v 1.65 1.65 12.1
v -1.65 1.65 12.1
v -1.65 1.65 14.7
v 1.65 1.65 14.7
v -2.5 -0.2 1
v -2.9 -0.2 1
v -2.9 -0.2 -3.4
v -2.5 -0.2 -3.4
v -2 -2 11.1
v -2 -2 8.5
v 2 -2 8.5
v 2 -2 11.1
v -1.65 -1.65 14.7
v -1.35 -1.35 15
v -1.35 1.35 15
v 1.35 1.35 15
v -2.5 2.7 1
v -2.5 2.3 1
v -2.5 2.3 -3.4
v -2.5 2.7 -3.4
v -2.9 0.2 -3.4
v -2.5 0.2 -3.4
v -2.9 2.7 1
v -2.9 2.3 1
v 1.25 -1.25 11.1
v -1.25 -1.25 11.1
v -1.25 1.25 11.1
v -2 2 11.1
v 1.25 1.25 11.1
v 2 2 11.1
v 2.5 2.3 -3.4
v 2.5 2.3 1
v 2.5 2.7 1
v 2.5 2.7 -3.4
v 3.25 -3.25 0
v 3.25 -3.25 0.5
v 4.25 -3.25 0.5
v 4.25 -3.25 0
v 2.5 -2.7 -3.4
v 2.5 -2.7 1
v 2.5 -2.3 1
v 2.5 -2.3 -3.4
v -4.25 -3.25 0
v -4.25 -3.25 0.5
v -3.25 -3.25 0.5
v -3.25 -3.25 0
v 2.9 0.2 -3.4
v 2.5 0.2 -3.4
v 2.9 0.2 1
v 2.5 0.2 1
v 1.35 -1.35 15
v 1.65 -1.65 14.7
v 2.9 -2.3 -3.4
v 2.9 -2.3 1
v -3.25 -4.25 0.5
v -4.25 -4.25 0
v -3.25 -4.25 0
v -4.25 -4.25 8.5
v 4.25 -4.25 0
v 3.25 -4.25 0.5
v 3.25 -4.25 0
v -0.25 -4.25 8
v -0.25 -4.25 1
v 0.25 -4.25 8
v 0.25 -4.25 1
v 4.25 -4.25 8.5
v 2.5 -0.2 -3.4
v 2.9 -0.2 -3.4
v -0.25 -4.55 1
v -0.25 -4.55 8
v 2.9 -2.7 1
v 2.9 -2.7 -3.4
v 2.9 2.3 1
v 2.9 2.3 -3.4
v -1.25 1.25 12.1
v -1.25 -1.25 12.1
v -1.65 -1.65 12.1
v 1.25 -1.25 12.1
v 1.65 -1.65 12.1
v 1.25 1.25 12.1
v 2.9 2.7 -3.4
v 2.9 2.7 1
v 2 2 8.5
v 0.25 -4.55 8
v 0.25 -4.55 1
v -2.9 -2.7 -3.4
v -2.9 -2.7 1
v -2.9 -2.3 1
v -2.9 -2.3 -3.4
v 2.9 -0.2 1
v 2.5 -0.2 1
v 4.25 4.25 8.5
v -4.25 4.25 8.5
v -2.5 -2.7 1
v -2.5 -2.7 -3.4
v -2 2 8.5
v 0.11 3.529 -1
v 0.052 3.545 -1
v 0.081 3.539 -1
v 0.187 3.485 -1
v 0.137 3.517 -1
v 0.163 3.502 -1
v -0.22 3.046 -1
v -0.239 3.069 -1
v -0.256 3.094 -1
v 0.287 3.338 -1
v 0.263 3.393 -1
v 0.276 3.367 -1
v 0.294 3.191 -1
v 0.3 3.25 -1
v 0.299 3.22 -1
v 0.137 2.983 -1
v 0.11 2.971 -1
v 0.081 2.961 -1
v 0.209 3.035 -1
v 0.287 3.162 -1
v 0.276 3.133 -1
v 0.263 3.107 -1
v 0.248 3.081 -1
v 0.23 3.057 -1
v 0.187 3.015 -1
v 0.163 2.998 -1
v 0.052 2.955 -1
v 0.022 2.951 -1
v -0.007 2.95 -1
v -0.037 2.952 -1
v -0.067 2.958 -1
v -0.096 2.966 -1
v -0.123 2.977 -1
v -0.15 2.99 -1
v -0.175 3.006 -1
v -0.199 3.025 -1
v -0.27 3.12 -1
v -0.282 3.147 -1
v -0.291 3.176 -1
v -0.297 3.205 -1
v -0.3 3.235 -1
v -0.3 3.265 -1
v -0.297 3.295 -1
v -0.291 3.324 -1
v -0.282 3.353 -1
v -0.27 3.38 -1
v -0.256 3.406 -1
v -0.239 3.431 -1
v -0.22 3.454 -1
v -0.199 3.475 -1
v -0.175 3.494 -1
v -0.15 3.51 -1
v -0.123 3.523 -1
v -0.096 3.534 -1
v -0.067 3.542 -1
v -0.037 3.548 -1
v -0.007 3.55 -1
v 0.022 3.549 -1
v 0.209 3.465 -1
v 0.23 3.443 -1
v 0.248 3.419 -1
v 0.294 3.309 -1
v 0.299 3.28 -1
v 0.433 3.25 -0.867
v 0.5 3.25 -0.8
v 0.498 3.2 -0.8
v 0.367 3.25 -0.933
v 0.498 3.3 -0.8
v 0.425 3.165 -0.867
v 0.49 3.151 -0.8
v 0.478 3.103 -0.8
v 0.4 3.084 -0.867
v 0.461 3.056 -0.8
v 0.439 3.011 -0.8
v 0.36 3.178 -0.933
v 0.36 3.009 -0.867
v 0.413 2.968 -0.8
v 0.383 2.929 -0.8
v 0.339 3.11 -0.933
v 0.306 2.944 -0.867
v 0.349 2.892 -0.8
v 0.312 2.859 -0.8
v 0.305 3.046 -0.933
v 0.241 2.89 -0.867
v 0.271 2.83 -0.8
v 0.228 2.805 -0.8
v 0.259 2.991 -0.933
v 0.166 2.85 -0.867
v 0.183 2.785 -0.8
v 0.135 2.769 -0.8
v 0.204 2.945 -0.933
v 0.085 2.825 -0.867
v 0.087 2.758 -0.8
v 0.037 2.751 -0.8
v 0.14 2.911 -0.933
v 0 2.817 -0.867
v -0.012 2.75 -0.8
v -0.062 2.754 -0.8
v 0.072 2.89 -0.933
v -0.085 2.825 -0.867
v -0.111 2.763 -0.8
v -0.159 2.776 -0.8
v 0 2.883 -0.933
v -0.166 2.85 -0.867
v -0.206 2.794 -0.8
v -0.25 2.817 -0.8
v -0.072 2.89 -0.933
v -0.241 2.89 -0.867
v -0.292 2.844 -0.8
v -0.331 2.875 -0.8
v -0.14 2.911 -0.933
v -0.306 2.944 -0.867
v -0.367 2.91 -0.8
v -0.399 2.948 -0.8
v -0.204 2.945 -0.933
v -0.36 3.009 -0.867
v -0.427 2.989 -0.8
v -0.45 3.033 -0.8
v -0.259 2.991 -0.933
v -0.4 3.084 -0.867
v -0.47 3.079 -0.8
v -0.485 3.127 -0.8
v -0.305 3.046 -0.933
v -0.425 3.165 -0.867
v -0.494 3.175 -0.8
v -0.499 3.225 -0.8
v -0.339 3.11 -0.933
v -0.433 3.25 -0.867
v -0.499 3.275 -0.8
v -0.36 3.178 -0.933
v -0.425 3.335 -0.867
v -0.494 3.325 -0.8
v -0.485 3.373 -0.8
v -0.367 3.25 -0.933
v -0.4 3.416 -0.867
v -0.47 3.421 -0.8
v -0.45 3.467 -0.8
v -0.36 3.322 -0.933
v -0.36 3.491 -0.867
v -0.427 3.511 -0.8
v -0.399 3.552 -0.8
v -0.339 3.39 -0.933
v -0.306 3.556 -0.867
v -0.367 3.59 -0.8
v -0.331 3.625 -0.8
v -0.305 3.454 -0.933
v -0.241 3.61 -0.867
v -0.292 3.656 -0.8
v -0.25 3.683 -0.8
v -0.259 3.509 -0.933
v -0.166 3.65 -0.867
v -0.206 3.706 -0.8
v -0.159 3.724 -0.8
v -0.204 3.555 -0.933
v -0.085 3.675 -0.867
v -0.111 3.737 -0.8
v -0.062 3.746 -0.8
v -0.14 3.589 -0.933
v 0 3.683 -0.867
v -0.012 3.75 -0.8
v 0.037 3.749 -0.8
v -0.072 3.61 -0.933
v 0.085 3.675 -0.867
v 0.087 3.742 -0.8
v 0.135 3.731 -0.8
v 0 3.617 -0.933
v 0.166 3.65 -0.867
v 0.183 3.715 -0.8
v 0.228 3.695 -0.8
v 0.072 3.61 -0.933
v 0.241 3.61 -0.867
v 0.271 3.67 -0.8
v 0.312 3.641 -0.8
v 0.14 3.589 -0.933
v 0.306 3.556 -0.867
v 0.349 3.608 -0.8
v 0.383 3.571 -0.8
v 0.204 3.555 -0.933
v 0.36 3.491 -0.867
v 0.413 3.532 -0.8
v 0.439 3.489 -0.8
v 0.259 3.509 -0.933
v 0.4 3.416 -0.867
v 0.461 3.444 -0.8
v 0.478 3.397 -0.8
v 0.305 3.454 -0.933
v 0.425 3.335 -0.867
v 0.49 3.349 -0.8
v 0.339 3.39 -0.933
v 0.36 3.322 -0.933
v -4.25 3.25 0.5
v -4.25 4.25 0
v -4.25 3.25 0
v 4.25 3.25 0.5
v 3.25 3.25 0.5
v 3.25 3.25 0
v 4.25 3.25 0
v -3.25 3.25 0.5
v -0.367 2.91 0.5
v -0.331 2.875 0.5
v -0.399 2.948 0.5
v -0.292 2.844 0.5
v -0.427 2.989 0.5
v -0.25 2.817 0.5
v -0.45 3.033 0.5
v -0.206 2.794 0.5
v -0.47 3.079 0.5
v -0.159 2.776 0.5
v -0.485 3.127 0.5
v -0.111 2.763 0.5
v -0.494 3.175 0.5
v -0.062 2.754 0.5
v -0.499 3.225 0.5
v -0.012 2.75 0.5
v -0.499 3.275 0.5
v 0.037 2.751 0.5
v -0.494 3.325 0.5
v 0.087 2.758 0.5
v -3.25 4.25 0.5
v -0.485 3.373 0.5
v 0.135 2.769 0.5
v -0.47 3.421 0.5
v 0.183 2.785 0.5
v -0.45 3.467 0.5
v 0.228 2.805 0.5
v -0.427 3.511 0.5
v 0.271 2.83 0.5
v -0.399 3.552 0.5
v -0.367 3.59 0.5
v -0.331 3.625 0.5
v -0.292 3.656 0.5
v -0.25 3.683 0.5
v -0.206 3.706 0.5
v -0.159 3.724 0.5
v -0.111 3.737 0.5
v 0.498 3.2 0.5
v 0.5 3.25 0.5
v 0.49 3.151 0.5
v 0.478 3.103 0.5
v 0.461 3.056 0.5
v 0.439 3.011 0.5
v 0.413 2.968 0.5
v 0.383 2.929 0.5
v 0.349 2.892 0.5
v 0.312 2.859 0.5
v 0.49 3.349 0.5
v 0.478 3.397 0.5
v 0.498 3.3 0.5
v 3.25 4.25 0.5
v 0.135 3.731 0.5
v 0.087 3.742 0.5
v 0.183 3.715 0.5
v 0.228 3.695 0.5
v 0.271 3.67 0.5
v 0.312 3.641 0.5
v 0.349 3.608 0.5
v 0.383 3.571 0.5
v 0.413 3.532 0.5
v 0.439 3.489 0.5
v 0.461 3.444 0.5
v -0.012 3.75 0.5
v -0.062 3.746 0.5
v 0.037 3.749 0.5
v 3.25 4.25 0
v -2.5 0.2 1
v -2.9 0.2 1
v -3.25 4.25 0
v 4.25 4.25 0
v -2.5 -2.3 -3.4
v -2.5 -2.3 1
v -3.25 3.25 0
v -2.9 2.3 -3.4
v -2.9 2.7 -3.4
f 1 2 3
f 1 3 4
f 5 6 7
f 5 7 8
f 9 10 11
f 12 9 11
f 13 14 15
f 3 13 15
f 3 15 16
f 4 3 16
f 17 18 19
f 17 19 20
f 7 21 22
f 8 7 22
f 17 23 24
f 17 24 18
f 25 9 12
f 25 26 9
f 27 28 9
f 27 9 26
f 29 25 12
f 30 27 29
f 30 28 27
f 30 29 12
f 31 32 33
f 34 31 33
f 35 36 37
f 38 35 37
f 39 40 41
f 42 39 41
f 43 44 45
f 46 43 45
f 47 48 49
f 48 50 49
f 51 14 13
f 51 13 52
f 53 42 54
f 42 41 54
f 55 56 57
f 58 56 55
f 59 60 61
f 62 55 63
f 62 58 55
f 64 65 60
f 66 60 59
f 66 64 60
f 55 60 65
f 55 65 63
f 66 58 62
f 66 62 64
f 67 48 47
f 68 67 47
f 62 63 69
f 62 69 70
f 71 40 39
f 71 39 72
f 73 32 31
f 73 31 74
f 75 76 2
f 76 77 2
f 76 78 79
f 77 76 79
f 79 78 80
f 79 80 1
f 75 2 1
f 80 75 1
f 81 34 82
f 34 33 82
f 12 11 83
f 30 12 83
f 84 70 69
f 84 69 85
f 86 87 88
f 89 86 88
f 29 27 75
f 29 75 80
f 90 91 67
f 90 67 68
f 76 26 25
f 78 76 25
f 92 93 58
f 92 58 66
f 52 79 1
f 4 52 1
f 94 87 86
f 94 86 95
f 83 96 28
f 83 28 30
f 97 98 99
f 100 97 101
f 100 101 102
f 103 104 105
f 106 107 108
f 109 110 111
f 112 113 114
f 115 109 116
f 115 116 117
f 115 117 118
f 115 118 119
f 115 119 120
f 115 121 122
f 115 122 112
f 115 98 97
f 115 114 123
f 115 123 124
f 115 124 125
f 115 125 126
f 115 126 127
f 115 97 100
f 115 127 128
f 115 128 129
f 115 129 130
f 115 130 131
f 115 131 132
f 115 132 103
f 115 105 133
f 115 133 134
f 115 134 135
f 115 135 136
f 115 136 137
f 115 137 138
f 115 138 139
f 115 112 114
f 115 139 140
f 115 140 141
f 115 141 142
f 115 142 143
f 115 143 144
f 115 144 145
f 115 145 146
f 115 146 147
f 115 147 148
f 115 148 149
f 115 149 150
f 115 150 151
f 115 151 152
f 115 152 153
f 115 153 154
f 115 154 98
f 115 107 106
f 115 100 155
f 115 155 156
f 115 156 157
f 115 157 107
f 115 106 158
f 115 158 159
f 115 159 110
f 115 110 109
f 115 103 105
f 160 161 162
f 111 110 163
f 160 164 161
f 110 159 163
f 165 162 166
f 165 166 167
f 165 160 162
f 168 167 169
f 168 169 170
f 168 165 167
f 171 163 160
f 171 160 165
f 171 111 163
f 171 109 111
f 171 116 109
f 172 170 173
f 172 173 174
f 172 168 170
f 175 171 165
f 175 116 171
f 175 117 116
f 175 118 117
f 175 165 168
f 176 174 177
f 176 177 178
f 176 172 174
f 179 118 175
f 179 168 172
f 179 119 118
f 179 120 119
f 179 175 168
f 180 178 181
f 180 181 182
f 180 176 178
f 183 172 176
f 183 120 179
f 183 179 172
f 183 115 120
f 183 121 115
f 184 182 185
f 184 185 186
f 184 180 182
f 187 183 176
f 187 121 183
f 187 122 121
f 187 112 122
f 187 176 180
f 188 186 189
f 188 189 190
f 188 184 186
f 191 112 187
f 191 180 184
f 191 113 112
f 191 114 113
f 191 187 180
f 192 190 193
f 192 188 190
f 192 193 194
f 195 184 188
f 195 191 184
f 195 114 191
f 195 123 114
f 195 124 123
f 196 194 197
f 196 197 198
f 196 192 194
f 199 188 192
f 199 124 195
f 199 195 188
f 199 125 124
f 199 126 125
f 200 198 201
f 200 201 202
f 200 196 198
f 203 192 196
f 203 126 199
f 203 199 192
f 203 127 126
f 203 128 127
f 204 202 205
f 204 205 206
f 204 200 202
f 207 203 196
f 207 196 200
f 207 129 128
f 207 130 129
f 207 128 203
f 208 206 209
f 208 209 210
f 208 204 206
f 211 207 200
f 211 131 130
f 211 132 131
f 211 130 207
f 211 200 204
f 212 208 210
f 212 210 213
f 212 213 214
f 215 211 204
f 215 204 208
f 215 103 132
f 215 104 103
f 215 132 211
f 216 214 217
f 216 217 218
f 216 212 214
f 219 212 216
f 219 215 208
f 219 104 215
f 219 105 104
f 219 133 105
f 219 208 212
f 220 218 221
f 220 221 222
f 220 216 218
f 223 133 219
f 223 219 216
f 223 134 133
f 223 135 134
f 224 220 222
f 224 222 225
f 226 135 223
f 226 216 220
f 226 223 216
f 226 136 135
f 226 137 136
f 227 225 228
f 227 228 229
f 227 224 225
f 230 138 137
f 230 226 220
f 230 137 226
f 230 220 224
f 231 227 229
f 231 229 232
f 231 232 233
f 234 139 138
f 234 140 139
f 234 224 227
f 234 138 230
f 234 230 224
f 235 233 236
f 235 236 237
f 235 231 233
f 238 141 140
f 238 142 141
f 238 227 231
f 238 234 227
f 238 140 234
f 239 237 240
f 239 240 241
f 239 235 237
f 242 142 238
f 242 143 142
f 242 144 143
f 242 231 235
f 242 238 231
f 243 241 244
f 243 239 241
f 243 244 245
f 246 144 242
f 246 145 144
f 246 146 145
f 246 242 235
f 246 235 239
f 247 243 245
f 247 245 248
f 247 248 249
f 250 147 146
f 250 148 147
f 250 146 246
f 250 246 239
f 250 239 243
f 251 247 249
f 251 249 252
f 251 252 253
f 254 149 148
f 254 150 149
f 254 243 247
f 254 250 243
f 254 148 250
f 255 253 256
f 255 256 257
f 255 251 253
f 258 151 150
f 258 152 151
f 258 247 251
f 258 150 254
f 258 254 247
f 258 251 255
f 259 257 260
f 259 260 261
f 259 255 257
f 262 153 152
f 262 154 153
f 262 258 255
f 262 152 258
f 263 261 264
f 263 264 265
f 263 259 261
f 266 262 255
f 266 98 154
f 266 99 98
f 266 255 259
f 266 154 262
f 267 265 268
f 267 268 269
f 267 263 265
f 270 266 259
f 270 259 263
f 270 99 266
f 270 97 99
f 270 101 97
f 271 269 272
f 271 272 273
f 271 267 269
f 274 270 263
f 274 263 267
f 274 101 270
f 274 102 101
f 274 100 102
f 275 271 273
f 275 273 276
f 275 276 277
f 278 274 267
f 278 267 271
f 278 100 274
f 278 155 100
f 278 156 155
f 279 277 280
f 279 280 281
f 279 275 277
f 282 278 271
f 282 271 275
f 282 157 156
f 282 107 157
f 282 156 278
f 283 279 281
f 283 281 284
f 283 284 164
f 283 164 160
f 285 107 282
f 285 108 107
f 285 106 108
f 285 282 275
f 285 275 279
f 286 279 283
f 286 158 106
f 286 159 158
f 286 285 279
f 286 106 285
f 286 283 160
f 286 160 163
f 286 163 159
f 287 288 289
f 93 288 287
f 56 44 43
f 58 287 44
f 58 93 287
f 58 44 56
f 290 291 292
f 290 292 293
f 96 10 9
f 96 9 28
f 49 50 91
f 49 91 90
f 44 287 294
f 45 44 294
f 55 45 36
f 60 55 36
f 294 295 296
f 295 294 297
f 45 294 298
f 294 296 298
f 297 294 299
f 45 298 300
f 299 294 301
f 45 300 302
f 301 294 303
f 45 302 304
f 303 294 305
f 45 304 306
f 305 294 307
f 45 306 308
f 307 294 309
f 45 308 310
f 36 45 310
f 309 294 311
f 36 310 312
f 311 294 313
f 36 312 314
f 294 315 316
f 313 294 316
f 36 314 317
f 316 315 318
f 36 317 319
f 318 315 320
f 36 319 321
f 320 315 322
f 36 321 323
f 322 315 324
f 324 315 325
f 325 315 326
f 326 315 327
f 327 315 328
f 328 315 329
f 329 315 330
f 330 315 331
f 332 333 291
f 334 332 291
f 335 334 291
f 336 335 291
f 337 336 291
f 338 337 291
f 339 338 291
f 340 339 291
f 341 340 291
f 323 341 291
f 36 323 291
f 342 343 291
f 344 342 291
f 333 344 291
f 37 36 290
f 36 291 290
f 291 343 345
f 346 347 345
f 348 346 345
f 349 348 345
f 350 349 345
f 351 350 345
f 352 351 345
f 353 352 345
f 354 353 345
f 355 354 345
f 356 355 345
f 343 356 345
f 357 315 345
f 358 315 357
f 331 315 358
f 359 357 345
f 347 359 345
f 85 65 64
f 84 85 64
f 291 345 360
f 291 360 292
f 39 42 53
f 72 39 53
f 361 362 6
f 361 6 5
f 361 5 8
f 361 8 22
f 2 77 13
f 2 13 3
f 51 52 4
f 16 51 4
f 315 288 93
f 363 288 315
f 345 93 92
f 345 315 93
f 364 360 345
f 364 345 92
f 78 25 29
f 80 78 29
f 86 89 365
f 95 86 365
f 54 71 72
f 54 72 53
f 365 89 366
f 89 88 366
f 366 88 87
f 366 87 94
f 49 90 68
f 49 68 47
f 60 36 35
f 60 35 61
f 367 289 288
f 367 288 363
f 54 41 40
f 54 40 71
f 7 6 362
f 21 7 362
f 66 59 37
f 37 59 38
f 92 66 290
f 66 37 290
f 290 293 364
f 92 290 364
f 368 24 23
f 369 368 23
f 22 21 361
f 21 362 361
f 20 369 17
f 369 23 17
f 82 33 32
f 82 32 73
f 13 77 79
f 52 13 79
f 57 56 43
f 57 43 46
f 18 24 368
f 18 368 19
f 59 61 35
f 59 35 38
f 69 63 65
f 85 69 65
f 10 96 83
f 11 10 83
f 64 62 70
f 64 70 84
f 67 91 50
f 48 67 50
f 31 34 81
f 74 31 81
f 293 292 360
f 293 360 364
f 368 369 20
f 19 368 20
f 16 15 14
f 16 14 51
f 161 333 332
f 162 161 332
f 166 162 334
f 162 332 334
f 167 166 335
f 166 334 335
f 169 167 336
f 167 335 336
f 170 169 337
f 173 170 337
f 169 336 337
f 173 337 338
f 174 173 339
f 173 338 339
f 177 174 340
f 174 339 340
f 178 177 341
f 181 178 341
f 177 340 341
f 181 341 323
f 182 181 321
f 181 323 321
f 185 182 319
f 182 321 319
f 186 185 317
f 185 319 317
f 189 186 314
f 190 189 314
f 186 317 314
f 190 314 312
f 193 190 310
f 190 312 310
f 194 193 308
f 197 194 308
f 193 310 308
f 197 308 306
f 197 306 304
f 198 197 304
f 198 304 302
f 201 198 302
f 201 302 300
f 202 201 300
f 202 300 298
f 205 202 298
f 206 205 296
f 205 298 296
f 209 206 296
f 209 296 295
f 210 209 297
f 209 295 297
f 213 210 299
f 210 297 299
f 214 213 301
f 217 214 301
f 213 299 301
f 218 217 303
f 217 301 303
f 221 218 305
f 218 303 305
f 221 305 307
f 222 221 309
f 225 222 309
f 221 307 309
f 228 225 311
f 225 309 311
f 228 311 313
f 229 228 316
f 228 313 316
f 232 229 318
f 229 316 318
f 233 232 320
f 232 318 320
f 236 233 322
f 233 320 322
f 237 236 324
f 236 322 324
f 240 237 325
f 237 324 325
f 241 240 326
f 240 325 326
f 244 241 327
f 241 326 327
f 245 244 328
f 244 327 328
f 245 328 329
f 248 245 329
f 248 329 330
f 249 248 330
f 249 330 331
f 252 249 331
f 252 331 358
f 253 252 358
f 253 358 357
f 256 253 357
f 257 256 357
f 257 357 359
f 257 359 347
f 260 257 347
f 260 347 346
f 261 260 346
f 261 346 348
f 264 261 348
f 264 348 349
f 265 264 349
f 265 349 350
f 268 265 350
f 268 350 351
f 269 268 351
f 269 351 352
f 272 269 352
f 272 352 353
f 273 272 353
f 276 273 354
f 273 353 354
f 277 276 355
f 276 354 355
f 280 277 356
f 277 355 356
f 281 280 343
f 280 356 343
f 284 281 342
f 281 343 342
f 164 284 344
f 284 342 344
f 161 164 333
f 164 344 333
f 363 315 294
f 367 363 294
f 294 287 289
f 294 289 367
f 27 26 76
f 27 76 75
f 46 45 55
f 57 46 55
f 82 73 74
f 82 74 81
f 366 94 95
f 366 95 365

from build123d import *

# Parameters (mm, degrees)
F0_W          = 0.4
F0_H          = 0.4
F1_DEPTH      = 1
F1_DEPTH_BACK = 3.4
F3_START      = 0.5
F2_W          = 8.5
F2_H          = 8.5
F3_DEPTH      = 8
F4_W          = 1
F4_H          = 1
F5_DEPTH      = 0.5
F6_W          = 0.5
F6_H          = 7
F7_DEPTH      = 0.3
F8_R          = 0.5
F9_DEPTH      = 1.5
F10_SIZE      = 0.2
F11_W         = 4
F11_H         = 4
F12_DEPTH     = 2.6
F13_W         = 2.5
F13_H         = 2.5
F14_DEPTH     = 1
F15_W         = 3.3
F15_H         = 3.3
F16_DEPTH     = 2.9
F17_SIZE2     = 0.3
F17_SIZE      = 0.3


with BuildPart() as f1:
    # F0 (on Top) → F1 (new body, two sides)
    with BuildSketch(Plane.XY) as f1_sk:
        with Locations((-2.7, -2.5)):
            Rectangle(F0_W, F0_H)
    extrude(amount=F1_DEPTH)
    extrude(f1_sk.sketch, amount=-F1_DEPTH_BACK)


with BuildPart() as f1b:
    # F0 (on Top) → F1, piece 2 (new body, two sides)
    with BuildSketch(Plane.XY) as f1_2_sk:
        with Locations((-2.7, 0)):
            Rectangle(F0_W, F0_H)
    extrude(amount=F1_DEPTH)
    extrude(f1_2_sk.sketch, amount=-F1_DEPTH_BACK)


with BuildPart() as f1c:
    # F0 (on Top) → F1, piece 3 (new body, two sides)
    with BuildSketch(Plane.XY) as f1_3_sk:
        with Locations((-2.7, 2.5)):
            Rectangle(F0_W, F0_H)
    extrude(amount=F1_DEPTH)
    extrude(f1_3_sk.sketch, amount=-F1_DEPTH_BACK)


with BuildPart() as f1d:
    # F0 (on Top) → F1, piece 4 (new body, two sides)
    with BuildSketch(Plane.XY) as f1_4_sk:
        with Locations((2.7, 2.5)):
            Rectangle(F0_W, F0_H)
    extrude(amount=F1_DEPTH)
    extrude(f1_4_sk.sketch, amount=-F1_DEPTH_BACK)


with BuildPart() as f1e:
    # F0 (on Top) → F1, piece 5 (new body, two sides)
    with BuildSketch(Plane.XY) as f1_5_sk:
        with Locations((2.7, 0)):
            Rectangle(F0_W, F0_H)
    extrude(amount=F1_DEPTH)
    extrude(f1_5_sk.sketch, amount=-F1_DEPTH_BACK)


with BuildPart() as f1f:
    # F0 (on Top) → F1, piece 6 (new body, two sides)
    with BuildSketch(Plane.XY) as f1_6_sk:
        with Locations((2.7, -2.5)):
            Rectangle(F0_W, F0_H)
    extrude(amount=F1_DEPTH)
    extrude(f1_6_sk.sketch, amount=-F1_DEPTH_BACK)


with BuildPart() as f3:
    # F2 (on Top) → F3 (new body)
    with BuildSketch(Plane.XY.offset(F3_START)):
        Rectangle(F2_W, F2_H)
    extrude(amount=F3_DEPTH)

    # F4 (on face) → F5 (join)
    with BuildSketch(Plane(origin=(0, 0, 0.5), x_dir=(1, 0, 0), z_dir=(0, 0, -1))):
        with Locations((-3.75, 3.75)):
            Rectangle(F4_W, F4_H)
        with Locations((3.75, 3.75)):
            Rectangle(F4_W, F4_H)
        with Locations((3.75, -3.75)):
            Rectangle(F4_W, F4_H)
        with Locations((-3.75, -3.75)):
            Rectangle(F4_W, F4_H)
    extrude(amount=F5_DEPTH)

    # F6 (on face) → F7 (join)
    with BuildSketch(Plane.XZ.offset(4.25)):
        with Locations((0, 4.5)):
            Rectangle(F6_W, F6_H)
    extrude(amount=F7_DEPTH)

    # F8 (on face) → F9 (join)
    with BuildSketch(Plane(origin=(0, 0, 0.5), x_dir=(1, 0, 0), z_dir=(0, 0, -1))):
        with Locations((0, -3.25)):
            Circle(F8_R)
    extrude(amount=F9_DEPTH)

    # F10
    f10_edges = [f3.edges().sort_by_distance(p)[0] for p in [
        (-0.5, 3.25, -1),
    ]]
    chamfer(f10_edges, length=F10_SIZE)


with BuildPart() as f12:
    # F11 (on face) → F12 (new body)
    with BuildSketch(Plane.XY.offset(8.5)):
        Rectangle(F11_W, F11_H)
    extrude(amount=F12_DEPTH)

    # F13 (on face) → F14 (join)
    with BuildSketch(Plane.XY.offset(11.1)):
        Rectangle(F13_W, F13_H)
    extrude(amount=F14_DEPTH)

    # F15 (on face) → F16 (join)
    with BuildSketch(Plane.XY.offset(12.1)):
        Rectangle(F15_W, F15_H)
    extrude(amount=F16_DEPTH)

    # F17
    f17_edges = [f12.edges().sort_by_distance(p)[0] for p in [
        (-1.65, 0, 15),
        (0, -1.65, 15),
        (1.65, 0, 15),
        (0, 1.65, 15),
    ]]
    chamfer(f17_edges, length=F17_SIZE, length2=F17_SIZE2)


solid = Compound([f1.part, f1b.part, f1c.part, f1d.part, f1e.part, f1f.part, f3.part, f12.part])
